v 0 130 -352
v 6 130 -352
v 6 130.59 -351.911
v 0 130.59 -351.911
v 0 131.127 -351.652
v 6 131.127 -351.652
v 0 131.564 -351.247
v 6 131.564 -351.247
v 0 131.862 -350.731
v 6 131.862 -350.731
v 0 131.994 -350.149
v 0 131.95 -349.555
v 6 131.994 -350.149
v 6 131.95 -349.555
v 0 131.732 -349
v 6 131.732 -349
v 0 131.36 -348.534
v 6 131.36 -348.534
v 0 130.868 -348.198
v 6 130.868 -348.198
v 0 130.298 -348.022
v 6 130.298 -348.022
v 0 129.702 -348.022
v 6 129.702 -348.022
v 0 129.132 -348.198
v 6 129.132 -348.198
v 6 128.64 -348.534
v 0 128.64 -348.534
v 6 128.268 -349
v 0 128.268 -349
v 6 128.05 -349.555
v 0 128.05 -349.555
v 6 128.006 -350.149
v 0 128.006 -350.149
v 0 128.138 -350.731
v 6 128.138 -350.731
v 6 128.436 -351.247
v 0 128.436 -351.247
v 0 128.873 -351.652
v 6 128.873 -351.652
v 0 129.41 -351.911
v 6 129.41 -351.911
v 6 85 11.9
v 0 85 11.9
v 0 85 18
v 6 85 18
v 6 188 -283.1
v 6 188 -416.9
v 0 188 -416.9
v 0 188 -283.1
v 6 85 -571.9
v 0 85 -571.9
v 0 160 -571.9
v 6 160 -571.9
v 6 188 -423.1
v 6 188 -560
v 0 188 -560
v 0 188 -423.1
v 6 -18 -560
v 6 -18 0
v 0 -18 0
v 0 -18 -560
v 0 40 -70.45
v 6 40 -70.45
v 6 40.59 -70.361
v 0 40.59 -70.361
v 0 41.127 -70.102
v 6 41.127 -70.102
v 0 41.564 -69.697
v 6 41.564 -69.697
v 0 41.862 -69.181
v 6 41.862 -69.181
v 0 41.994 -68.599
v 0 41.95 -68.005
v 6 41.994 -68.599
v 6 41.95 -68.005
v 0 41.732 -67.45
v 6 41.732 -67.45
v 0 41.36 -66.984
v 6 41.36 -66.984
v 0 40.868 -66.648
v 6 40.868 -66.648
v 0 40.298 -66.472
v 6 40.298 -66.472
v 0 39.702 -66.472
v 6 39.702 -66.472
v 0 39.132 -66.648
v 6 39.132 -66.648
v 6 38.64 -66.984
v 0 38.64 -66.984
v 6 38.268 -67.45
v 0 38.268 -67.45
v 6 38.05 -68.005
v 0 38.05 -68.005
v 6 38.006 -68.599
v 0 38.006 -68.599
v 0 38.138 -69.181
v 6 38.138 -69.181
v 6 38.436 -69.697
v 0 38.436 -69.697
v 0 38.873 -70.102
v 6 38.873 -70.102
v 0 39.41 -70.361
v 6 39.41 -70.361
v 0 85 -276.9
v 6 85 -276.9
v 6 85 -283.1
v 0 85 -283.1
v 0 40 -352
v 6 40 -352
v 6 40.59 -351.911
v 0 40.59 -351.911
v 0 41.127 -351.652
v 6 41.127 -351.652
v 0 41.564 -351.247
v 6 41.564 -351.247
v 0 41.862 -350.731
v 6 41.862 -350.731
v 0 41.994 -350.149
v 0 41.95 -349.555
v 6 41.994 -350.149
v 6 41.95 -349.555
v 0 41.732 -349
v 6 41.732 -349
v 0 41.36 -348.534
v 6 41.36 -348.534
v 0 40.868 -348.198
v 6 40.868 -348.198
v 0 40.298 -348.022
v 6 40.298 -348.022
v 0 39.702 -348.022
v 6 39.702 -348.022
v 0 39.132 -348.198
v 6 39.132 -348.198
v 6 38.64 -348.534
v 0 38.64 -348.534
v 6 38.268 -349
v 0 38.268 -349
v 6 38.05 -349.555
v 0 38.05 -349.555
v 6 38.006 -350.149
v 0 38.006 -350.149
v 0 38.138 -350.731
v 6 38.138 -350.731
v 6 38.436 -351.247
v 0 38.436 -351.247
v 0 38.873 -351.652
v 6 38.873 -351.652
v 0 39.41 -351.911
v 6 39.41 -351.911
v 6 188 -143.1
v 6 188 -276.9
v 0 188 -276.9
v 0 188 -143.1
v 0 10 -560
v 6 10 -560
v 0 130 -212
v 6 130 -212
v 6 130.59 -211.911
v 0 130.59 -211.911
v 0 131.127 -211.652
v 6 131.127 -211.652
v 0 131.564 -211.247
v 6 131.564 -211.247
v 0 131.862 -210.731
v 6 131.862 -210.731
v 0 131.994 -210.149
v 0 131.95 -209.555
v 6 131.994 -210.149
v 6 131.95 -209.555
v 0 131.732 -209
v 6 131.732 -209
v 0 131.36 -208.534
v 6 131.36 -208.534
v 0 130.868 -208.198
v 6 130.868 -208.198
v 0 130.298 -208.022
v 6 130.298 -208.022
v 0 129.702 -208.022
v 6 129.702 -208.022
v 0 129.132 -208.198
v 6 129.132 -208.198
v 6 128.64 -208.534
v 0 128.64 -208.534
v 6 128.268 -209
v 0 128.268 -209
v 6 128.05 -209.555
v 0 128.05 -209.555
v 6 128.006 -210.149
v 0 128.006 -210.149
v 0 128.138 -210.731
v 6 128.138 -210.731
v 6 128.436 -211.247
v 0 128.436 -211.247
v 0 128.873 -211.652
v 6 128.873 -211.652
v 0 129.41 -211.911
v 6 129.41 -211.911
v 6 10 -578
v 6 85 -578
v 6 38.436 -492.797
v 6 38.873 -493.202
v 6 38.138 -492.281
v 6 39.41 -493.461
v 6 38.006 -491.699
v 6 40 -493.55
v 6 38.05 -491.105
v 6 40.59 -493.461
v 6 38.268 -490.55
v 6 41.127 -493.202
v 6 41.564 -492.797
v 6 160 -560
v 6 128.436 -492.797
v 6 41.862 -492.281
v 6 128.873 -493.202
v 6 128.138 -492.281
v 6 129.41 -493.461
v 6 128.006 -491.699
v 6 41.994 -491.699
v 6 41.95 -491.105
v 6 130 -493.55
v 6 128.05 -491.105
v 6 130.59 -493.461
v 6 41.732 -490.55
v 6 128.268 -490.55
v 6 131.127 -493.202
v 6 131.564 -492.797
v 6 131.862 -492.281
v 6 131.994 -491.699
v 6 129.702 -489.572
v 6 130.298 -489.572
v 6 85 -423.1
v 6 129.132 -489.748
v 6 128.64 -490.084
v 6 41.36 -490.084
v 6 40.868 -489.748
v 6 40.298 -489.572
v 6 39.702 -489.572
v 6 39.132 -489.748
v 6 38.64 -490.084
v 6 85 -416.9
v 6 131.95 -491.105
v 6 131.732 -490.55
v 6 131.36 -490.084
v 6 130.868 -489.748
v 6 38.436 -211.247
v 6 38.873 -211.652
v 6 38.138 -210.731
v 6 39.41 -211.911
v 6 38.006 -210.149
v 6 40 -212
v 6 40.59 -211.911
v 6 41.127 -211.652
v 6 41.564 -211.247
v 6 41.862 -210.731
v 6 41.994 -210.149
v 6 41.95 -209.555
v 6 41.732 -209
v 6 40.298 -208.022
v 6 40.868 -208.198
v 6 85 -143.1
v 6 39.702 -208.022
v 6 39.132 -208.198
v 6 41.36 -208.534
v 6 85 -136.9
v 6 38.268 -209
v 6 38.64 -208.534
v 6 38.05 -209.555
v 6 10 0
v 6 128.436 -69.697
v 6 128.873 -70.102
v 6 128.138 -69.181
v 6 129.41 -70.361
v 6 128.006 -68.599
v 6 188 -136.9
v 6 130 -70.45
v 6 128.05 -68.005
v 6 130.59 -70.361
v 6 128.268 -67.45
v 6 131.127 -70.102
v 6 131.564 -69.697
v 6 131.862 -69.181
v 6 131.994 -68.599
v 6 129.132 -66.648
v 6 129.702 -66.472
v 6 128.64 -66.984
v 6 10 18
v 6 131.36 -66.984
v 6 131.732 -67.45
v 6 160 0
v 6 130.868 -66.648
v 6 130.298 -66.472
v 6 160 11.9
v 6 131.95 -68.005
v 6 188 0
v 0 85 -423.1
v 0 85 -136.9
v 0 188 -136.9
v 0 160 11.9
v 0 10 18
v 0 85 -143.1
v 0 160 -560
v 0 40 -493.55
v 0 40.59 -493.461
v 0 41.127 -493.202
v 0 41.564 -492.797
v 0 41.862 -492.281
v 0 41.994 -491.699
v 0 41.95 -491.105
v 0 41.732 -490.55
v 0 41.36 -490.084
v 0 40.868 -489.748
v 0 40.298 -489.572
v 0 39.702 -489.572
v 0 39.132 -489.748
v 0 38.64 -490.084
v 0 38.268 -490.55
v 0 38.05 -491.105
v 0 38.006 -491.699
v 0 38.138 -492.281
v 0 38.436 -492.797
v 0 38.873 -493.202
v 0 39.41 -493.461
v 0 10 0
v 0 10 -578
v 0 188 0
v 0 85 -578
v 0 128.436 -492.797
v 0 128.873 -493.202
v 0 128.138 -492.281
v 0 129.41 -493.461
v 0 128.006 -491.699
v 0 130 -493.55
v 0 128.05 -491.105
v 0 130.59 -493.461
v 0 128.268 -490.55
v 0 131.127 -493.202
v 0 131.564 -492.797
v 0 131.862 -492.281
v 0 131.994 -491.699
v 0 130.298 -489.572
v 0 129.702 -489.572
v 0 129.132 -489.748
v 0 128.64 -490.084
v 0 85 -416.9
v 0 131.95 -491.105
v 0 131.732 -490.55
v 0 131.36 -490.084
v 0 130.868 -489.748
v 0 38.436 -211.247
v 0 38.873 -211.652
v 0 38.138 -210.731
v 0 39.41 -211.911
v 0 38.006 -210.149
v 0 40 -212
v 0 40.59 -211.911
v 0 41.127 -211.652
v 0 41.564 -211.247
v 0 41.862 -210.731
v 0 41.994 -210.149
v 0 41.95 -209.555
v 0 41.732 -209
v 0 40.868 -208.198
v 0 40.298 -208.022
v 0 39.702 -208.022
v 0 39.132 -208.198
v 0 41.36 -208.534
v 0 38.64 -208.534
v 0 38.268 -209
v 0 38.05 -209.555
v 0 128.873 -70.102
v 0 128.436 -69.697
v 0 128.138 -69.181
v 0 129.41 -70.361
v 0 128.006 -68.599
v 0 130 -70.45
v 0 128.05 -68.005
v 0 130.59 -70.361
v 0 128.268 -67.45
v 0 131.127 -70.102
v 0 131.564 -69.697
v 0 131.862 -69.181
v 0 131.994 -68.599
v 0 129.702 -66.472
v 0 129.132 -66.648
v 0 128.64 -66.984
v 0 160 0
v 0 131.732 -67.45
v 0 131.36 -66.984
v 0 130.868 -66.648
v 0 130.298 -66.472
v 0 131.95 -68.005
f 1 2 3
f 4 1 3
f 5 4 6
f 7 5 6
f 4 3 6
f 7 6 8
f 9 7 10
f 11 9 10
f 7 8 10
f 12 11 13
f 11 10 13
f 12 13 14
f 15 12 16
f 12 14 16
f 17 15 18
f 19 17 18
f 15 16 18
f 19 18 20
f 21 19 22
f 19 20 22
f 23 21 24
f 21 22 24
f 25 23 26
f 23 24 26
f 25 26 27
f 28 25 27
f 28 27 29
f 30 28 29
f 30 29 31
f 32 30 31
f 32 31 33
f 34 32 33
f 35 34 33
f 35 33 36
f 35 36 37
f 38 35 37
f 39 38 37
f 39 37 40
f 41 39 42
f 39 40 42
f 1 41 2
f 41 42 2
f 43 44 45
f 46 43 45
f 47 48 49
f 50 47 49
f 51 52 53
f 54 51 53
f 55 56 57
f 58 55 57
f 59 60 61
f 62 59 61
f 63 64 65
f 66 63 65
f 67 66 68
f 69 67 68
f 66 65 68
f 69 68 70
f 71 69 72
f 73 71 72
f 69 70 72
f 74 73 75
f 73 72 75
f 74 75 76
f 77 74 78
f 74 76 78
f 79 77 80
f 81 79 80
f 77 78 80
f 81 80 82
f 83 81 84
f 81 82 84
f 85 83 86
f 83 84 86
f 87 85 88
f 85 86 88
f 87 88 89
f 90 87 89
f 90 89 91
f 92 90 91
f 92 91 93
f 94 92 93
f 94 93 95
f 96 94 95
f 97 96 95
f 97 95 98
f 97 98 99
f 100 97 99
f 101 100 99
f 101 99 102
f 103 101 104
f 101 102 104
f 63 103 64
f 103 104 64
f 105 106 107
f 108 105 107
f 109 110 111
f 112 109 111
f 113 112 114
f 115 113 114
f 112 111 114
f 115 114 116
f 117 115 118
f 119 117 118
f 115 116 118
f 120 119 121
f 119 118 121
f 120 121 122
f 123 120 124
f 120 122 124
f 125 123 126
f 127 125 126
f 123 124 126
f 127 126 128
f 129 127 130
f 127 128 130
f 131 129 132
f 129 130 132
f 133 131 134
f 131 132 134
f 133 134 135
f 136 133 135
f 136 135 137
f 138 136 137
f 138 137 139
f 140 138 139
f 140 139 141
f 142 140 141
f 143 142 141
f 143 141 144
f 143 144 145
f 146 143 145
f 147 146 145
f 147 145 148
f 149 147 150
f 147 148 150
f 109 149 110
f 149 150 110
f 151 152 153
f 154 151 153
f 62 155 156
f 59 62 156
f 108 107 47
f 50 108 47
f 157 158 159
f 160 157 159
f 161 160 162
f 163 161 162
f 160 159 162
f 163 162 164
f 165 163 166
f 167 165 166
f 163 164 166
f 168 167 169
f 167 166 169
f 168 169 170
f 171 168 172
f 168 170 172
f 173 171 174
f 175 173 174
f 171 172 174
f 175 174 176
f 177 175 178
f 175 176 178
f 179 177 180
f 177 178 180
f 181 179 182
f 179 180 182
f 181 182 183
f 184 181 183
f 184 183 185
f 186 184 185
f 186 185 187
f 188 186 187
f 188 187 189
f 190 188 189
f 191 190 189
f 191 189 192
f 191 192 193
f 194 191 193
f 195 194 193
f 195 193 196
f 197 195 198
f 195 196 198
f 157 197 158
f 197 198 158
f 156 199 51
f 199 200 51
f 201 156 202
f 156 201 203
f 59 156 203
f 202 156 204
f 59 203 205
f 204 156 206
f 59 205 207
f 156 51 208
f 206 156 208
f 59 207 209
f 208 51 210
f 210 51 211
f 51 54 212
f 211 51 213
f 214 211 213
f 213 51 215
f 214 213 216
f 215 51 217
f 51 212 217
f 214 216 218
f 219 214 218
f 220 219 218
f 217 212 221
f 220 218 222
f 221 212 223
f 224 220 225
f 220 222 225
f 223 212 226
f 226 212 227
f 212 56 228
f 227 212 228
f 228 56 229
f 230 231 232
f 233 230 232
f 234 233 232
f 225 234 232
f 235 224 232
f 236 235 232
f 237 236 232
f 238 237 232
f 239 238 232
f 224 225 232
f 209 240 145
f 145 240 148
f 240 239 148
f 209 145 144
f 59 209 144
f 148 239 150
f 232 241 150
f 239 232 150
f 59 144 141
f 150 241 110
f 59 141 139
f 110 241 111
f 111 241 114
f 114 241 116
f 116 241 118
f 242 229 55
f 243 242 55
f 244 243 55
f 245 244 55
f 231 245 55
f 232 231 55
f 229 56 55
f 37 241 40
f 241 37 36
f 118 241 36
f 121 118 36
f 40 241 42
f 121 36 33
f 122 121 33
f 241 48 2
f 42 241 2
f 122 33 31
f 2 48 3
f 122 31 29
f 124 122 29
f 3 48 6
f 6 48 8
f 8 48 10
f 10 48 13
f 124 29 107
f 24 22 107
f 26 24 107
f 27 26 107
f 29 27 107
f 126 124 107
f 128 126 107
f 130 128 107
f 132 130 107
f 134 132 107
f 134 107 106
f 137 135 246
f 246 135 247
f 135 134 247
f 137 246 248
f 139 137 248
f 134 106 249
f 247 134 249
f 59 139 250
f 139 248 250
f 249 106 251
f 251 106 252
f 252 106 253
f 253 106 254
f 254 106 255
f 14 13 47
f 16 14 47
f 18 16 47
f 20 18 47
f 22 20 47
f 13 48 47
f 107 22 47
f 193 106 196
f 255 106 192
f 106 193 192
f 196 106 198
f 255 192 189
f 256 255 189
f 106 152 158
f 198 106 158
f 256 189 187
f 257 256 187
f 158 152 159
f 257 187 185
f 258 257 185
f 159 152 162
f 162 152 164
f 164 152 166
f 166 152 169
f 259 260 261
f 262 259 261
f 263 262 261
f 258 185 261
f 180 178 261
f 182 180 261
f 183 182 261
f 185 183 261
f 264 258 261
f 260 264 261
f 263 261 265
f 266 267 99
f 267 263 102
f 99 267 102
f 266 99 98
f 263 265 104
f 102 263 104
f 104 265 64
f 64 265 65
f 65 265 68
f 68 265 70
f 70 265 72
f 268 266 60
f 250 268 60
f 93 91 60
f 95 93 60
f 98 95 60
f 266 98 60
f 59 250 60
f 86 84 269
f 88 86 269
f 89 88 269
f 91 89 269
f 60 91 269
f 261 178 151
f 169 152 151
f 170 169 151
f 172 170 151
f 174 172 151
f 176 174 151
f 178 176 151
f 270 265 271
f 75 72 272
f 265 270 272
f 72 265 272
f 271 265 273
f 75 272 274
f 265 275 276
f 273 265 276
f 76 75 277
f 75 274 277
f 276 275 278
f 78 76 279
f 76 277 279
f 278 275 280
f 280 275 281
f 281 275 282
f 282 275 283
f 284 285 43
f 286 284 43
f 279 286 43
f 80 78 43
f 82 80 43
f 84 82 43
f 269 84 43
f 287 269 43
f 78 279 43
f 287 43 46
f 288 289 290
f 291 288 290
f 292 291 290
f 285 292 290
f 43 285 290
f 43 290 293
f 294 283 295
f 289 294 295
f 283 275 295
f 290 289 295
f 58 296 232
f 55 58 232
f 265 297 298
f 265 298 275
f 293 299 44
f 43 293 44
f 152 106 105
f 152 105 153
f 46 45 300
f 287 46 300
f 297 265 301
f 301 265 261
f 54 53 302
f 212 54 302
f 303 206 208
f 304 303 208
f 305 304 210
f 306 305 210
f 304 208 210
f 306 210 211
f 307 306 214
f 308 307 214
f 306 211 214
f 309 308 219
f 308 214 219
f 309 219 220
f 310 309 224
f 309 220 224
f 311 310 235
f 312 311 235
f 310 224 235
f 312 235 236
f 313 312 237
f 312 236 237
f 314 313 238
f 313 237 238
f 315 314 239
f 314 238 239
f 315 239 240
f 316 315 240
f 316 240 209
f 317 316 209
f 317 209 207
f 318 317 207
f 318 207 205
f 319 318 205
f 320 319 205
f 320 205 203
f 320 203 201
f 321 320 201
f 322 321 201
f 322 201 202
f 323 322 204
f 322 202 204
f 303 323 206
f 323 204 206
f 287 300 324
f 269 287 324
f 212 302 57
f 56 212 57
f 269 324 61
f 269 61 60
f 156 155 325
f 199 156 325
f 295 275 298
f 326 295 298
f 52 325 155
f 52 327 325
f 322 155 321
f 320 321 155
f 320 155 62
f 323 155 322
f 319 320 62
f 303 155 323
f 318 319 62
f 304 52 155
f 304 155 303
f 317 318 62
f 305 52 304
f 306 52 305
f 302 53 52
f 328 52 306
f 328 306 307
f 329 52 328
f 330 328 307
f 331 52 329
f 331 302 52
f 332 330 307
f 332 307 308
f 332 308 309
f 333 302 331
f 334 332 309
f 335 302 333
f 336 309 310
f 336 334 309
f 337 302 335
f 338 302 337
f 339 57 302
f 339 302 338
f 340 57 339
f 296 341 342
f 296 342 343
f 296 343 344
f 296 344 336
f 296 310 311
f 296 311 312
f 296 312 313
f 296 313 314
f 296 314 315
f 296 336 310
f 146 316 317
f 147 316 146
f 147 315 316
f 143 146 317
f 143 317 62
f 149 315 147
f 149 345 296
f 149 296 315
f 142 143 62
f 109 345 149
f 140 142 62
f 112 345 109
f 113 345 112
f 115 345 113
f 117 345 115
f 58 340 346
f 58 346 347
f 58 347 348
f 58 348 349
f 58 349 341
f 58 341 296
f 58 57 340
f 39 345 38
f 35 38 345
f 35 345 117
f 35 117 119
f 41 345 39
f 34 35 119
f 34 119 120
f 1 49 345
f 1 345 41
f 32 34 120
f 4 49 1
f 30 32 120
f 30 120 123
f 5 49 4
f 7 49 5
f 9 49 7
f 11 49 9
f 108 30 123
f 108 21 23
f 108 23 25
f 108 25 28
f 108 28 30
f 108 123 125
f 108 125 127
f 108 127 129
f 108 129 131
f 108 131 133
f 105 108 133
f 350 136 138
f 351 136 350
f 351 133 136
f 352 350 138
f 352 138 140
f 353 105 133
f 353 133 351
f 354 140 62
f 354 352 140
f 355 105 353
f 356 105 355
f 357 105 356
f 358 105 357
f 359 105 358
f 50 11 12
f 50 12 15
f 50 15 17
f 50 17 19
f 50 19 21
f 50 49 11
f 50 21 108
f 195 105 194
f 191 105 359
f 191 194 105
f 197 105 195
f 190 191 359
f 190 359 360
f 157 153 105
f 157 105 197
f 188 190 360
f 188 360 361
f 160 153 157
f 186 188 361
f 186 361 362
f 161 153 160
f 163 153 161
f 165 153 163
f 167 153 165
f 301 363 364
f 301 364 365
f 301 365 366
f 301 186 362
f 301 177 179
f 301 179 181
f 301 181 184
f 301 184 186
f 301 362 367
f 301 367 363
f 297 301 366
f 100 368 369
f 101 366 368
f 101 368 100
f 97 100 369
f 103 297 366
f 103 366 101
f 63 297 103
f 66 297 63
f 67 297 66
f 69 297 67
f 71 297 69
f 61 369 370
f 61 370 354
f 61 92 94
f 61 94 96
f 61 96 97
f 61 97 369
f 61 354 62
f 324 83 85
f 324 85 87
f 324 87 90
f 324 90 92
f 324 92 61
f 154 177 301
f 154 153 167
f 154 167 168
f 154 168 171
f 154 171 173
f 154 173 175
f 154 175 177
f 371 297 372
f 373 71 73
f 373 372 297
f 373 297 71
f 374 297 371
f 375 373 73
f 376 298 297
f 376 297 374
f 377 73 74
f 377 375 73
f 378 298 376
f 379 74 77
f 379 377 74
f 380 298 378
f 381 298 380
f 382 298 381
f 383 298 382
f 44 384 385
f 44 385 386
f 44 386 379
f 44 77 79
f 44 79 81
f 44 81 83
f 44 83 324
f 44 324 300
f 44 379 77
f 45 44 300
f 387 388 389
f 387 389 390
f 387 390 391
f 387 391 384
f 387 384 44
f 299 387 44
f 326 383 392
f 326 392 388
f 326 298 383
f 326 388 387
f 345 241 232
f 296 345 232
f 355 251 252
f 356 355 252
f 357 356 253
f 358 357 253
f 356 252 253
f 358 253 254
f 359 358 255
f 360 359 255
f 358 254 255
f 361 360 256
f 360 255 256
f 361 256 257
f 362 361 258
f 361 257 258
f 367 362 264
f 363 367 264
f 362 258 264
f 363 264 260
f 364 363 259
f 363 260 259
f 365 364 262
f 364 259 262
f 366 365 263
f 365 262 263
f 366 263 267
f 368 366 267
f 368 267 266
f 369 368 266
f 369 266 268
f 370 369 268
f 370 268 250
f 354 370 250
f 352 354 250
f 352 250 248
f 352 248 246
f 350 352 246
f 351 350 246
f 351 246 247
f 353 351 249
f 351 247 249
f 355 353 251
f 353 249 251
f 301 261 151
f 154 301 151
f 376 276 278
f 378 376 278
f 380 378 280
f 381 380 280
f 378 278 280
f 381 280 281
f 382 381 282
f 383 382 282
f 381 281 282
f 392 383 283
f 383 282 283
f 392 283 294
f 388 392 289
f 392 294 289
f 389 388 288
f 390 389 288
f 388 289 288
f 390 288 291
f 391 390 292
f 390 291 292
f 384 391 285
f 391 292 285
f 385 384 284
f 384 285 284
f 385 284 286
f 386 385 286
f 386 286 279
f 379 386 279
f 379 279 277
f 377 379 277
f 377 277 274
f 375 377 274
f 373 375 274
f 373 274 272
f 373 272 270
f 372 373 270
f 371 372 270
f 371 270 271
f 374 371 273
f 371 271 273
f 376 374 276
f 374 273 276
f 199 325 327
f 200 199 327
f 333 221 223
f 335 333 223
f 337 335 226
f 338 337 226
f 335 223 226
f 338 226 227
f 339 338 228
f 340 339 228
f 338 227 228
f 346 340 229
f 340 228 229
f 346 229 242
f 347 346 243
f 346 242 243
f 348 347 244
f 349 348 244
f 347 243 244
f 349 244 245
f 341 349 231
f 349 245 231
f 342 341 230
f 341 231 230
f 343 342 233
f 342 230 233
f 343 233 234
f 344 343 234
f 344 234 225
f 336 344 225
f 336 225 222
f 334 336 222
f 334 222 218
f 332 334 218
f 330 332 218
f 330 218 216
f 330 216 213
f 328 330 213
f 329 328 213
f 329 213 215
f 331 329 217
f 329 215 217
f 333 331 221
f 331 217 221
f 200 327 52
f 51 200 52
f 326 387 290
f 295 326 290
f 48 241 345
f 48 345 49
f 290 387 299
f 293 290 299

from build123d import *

# Parameters (mm, degrees)
BOSS_EXTRUDE1_DEPTH = 6
SKETCH2_W           = 6.2
SKETCH2_H           = 85
CUT_EXTRUDE1_DEPTH  = 6
SKETCH3_R           = 2
CUT_EXTRUDE2_DEPTH  = 6
SKETCH4_W           = 6
SKETCH4_H           = 136.9
SKETCH4_H_2         = 133.8
SKETCH4_H_3         = 137.464807664
BOSS_EXTRUDE2_DEPTH = 28
SKETCH5_W           = 6
SKETCH5_H           = 560
BOSS_EXTRUDE3_DEPTH = 28
SKETCH6_W           = 6
SKETCH6_H           = 0.564807664
CUT_EXTRUDE3_DEPTH  = 28
SKETCH7_W           = 6
SKETCH7_H           = 10
CUT_EXTRUDE4_DEPTH  = 1000


with BuildPart() as part:
    # Sketch1 → Boss-Extrude1 (new body)
    with BuildSketch(Plane(origin=(0, 0, 0), x_dir=(0, 0, -1), z_dir=(1, 0, 0))):
        Polygon((0, 0), (560, 0), (560, 10), (578, 10), (578, 85), (571.9, 85), (571.9, 160), (560, 160), (560, 170), (0, 170), (0, 160), (-11.9, 160), (-11.9, 85), (-18, 85), (-18, 10), (0, 10), align=None)
    extrude(amount=BOSS_EXTRUDE1_DEPTH)

    # Sketch2 → Cut-Extrude1 (cut)
    with BuildSketch(Plane(origin=(6, 0, 0), x_dir=(0, 0, -1), z_dir=(1, 0, 0))):
        with Locations((140, 127.5)):
            Rectangle(SKETCH2_W, SKETCH2_H)
        with Locations((280, 127.5)):
            Rectangle(SKETCH2_W, SKETCH2_H)
        with Locations((420, 127.5)):
            Rectangle(SKETCH2_W, SKETCH2_H)
    extrude(amount=-CUT_EXTRUDE1_DEPTH, mode=Mode.SUBTRACT)

    # Sketch3 → Cut-Extrude2 (cut)
    with BuildSketch(Plane(origin=(6, 0, 0), x_dir=(0, 0, -1), z_dir=(1, 0, 0))):
        with Locations((68.45, 130)):
            Circle(SKETCH3_R)
        with Locations((68.45, 40)):
            Circle(SKETCH3_R)
        with Locations((210, 130)):
            Circle(SKETCH3_R)
        with Locations((210, 40)):
            Circle(SKETCH3_R)
        with Locations((350, 130)):
            Circle(SKETCH3_R)
        with Locations((350, 40)):
            Circle(SKETCH3_R)
        with Locations((491.55, 130)):
            Circle(SKETCH3_R)
        with Locations((491.55, 40)):
            Circle(SKETCH3_R)
    extrude(amount=-CUT_EXTRUDE2_DEPTH, mode=Mode.SUBTRACT)

    # Sketch4 → Boss-Extrude2 (add)
    with BuildSketch(Plane(origin=(0, 170, 0), x_dir=(1, 0, 0), z_dir=(0, 1, 0))):
        with Locations((3, 68.45)):
            Rectangle(SKETCH4_W, SKETCH4_H)
        with Locations((3, 210)):
            Rectangle(SKETCH4_W, SKETCH4_H_2)
        with Locations((3, 350)):
            Rectangle(SKETCH4_W, SKETCH4_H_2)
        with Locations((3, 491.267596168)):
            Rectangle(SKETCH4_W, SKETCH4_H_3)
    extrude(amount=BOSS_EXTRUDE2_DEPTH)

    # Sketch5 → Boss-Extrude3 (add)
    with BuildSketch(Plane.XZ):
        with Locations((3, -280)):
            Rectangle(SKETCH5_W, SKETCH5_H)
    extrude(amount=BOSS_EXTRUDE3_DEPTH)

    # Sketch6 → Cut-Extrude3 (cut)
    with BuildSketch(Plane.XZ.offset(-170)):
        with Locations((3, -422.817596168)):
            Rectangle(SKETCH6_W, SKETCH6_H)
    extrude(amount=-CUT_EXTRUDE3_DEPTH, mode=Mode.SUBTRACT)

    # Sketch7 → Cut-Extrude4 (cut)
    with BuildSketch(Plane(origin=(0, 0, -560), x_dir=(-1, 0, 0), z_dir=(0, 0, -1))):
        with Locations((-3, 193)):
            Rectangle(SKETCH7_W, SKETCH7_H)
        with Locations((-3, -23)):
            Rectangle(SKETCH7_W, SKETCH7_H)
    extrude(amount=-CUT_EXTRUDE4_DEPTH, mode=Mode.SUBTRACT)


solid = part.part
